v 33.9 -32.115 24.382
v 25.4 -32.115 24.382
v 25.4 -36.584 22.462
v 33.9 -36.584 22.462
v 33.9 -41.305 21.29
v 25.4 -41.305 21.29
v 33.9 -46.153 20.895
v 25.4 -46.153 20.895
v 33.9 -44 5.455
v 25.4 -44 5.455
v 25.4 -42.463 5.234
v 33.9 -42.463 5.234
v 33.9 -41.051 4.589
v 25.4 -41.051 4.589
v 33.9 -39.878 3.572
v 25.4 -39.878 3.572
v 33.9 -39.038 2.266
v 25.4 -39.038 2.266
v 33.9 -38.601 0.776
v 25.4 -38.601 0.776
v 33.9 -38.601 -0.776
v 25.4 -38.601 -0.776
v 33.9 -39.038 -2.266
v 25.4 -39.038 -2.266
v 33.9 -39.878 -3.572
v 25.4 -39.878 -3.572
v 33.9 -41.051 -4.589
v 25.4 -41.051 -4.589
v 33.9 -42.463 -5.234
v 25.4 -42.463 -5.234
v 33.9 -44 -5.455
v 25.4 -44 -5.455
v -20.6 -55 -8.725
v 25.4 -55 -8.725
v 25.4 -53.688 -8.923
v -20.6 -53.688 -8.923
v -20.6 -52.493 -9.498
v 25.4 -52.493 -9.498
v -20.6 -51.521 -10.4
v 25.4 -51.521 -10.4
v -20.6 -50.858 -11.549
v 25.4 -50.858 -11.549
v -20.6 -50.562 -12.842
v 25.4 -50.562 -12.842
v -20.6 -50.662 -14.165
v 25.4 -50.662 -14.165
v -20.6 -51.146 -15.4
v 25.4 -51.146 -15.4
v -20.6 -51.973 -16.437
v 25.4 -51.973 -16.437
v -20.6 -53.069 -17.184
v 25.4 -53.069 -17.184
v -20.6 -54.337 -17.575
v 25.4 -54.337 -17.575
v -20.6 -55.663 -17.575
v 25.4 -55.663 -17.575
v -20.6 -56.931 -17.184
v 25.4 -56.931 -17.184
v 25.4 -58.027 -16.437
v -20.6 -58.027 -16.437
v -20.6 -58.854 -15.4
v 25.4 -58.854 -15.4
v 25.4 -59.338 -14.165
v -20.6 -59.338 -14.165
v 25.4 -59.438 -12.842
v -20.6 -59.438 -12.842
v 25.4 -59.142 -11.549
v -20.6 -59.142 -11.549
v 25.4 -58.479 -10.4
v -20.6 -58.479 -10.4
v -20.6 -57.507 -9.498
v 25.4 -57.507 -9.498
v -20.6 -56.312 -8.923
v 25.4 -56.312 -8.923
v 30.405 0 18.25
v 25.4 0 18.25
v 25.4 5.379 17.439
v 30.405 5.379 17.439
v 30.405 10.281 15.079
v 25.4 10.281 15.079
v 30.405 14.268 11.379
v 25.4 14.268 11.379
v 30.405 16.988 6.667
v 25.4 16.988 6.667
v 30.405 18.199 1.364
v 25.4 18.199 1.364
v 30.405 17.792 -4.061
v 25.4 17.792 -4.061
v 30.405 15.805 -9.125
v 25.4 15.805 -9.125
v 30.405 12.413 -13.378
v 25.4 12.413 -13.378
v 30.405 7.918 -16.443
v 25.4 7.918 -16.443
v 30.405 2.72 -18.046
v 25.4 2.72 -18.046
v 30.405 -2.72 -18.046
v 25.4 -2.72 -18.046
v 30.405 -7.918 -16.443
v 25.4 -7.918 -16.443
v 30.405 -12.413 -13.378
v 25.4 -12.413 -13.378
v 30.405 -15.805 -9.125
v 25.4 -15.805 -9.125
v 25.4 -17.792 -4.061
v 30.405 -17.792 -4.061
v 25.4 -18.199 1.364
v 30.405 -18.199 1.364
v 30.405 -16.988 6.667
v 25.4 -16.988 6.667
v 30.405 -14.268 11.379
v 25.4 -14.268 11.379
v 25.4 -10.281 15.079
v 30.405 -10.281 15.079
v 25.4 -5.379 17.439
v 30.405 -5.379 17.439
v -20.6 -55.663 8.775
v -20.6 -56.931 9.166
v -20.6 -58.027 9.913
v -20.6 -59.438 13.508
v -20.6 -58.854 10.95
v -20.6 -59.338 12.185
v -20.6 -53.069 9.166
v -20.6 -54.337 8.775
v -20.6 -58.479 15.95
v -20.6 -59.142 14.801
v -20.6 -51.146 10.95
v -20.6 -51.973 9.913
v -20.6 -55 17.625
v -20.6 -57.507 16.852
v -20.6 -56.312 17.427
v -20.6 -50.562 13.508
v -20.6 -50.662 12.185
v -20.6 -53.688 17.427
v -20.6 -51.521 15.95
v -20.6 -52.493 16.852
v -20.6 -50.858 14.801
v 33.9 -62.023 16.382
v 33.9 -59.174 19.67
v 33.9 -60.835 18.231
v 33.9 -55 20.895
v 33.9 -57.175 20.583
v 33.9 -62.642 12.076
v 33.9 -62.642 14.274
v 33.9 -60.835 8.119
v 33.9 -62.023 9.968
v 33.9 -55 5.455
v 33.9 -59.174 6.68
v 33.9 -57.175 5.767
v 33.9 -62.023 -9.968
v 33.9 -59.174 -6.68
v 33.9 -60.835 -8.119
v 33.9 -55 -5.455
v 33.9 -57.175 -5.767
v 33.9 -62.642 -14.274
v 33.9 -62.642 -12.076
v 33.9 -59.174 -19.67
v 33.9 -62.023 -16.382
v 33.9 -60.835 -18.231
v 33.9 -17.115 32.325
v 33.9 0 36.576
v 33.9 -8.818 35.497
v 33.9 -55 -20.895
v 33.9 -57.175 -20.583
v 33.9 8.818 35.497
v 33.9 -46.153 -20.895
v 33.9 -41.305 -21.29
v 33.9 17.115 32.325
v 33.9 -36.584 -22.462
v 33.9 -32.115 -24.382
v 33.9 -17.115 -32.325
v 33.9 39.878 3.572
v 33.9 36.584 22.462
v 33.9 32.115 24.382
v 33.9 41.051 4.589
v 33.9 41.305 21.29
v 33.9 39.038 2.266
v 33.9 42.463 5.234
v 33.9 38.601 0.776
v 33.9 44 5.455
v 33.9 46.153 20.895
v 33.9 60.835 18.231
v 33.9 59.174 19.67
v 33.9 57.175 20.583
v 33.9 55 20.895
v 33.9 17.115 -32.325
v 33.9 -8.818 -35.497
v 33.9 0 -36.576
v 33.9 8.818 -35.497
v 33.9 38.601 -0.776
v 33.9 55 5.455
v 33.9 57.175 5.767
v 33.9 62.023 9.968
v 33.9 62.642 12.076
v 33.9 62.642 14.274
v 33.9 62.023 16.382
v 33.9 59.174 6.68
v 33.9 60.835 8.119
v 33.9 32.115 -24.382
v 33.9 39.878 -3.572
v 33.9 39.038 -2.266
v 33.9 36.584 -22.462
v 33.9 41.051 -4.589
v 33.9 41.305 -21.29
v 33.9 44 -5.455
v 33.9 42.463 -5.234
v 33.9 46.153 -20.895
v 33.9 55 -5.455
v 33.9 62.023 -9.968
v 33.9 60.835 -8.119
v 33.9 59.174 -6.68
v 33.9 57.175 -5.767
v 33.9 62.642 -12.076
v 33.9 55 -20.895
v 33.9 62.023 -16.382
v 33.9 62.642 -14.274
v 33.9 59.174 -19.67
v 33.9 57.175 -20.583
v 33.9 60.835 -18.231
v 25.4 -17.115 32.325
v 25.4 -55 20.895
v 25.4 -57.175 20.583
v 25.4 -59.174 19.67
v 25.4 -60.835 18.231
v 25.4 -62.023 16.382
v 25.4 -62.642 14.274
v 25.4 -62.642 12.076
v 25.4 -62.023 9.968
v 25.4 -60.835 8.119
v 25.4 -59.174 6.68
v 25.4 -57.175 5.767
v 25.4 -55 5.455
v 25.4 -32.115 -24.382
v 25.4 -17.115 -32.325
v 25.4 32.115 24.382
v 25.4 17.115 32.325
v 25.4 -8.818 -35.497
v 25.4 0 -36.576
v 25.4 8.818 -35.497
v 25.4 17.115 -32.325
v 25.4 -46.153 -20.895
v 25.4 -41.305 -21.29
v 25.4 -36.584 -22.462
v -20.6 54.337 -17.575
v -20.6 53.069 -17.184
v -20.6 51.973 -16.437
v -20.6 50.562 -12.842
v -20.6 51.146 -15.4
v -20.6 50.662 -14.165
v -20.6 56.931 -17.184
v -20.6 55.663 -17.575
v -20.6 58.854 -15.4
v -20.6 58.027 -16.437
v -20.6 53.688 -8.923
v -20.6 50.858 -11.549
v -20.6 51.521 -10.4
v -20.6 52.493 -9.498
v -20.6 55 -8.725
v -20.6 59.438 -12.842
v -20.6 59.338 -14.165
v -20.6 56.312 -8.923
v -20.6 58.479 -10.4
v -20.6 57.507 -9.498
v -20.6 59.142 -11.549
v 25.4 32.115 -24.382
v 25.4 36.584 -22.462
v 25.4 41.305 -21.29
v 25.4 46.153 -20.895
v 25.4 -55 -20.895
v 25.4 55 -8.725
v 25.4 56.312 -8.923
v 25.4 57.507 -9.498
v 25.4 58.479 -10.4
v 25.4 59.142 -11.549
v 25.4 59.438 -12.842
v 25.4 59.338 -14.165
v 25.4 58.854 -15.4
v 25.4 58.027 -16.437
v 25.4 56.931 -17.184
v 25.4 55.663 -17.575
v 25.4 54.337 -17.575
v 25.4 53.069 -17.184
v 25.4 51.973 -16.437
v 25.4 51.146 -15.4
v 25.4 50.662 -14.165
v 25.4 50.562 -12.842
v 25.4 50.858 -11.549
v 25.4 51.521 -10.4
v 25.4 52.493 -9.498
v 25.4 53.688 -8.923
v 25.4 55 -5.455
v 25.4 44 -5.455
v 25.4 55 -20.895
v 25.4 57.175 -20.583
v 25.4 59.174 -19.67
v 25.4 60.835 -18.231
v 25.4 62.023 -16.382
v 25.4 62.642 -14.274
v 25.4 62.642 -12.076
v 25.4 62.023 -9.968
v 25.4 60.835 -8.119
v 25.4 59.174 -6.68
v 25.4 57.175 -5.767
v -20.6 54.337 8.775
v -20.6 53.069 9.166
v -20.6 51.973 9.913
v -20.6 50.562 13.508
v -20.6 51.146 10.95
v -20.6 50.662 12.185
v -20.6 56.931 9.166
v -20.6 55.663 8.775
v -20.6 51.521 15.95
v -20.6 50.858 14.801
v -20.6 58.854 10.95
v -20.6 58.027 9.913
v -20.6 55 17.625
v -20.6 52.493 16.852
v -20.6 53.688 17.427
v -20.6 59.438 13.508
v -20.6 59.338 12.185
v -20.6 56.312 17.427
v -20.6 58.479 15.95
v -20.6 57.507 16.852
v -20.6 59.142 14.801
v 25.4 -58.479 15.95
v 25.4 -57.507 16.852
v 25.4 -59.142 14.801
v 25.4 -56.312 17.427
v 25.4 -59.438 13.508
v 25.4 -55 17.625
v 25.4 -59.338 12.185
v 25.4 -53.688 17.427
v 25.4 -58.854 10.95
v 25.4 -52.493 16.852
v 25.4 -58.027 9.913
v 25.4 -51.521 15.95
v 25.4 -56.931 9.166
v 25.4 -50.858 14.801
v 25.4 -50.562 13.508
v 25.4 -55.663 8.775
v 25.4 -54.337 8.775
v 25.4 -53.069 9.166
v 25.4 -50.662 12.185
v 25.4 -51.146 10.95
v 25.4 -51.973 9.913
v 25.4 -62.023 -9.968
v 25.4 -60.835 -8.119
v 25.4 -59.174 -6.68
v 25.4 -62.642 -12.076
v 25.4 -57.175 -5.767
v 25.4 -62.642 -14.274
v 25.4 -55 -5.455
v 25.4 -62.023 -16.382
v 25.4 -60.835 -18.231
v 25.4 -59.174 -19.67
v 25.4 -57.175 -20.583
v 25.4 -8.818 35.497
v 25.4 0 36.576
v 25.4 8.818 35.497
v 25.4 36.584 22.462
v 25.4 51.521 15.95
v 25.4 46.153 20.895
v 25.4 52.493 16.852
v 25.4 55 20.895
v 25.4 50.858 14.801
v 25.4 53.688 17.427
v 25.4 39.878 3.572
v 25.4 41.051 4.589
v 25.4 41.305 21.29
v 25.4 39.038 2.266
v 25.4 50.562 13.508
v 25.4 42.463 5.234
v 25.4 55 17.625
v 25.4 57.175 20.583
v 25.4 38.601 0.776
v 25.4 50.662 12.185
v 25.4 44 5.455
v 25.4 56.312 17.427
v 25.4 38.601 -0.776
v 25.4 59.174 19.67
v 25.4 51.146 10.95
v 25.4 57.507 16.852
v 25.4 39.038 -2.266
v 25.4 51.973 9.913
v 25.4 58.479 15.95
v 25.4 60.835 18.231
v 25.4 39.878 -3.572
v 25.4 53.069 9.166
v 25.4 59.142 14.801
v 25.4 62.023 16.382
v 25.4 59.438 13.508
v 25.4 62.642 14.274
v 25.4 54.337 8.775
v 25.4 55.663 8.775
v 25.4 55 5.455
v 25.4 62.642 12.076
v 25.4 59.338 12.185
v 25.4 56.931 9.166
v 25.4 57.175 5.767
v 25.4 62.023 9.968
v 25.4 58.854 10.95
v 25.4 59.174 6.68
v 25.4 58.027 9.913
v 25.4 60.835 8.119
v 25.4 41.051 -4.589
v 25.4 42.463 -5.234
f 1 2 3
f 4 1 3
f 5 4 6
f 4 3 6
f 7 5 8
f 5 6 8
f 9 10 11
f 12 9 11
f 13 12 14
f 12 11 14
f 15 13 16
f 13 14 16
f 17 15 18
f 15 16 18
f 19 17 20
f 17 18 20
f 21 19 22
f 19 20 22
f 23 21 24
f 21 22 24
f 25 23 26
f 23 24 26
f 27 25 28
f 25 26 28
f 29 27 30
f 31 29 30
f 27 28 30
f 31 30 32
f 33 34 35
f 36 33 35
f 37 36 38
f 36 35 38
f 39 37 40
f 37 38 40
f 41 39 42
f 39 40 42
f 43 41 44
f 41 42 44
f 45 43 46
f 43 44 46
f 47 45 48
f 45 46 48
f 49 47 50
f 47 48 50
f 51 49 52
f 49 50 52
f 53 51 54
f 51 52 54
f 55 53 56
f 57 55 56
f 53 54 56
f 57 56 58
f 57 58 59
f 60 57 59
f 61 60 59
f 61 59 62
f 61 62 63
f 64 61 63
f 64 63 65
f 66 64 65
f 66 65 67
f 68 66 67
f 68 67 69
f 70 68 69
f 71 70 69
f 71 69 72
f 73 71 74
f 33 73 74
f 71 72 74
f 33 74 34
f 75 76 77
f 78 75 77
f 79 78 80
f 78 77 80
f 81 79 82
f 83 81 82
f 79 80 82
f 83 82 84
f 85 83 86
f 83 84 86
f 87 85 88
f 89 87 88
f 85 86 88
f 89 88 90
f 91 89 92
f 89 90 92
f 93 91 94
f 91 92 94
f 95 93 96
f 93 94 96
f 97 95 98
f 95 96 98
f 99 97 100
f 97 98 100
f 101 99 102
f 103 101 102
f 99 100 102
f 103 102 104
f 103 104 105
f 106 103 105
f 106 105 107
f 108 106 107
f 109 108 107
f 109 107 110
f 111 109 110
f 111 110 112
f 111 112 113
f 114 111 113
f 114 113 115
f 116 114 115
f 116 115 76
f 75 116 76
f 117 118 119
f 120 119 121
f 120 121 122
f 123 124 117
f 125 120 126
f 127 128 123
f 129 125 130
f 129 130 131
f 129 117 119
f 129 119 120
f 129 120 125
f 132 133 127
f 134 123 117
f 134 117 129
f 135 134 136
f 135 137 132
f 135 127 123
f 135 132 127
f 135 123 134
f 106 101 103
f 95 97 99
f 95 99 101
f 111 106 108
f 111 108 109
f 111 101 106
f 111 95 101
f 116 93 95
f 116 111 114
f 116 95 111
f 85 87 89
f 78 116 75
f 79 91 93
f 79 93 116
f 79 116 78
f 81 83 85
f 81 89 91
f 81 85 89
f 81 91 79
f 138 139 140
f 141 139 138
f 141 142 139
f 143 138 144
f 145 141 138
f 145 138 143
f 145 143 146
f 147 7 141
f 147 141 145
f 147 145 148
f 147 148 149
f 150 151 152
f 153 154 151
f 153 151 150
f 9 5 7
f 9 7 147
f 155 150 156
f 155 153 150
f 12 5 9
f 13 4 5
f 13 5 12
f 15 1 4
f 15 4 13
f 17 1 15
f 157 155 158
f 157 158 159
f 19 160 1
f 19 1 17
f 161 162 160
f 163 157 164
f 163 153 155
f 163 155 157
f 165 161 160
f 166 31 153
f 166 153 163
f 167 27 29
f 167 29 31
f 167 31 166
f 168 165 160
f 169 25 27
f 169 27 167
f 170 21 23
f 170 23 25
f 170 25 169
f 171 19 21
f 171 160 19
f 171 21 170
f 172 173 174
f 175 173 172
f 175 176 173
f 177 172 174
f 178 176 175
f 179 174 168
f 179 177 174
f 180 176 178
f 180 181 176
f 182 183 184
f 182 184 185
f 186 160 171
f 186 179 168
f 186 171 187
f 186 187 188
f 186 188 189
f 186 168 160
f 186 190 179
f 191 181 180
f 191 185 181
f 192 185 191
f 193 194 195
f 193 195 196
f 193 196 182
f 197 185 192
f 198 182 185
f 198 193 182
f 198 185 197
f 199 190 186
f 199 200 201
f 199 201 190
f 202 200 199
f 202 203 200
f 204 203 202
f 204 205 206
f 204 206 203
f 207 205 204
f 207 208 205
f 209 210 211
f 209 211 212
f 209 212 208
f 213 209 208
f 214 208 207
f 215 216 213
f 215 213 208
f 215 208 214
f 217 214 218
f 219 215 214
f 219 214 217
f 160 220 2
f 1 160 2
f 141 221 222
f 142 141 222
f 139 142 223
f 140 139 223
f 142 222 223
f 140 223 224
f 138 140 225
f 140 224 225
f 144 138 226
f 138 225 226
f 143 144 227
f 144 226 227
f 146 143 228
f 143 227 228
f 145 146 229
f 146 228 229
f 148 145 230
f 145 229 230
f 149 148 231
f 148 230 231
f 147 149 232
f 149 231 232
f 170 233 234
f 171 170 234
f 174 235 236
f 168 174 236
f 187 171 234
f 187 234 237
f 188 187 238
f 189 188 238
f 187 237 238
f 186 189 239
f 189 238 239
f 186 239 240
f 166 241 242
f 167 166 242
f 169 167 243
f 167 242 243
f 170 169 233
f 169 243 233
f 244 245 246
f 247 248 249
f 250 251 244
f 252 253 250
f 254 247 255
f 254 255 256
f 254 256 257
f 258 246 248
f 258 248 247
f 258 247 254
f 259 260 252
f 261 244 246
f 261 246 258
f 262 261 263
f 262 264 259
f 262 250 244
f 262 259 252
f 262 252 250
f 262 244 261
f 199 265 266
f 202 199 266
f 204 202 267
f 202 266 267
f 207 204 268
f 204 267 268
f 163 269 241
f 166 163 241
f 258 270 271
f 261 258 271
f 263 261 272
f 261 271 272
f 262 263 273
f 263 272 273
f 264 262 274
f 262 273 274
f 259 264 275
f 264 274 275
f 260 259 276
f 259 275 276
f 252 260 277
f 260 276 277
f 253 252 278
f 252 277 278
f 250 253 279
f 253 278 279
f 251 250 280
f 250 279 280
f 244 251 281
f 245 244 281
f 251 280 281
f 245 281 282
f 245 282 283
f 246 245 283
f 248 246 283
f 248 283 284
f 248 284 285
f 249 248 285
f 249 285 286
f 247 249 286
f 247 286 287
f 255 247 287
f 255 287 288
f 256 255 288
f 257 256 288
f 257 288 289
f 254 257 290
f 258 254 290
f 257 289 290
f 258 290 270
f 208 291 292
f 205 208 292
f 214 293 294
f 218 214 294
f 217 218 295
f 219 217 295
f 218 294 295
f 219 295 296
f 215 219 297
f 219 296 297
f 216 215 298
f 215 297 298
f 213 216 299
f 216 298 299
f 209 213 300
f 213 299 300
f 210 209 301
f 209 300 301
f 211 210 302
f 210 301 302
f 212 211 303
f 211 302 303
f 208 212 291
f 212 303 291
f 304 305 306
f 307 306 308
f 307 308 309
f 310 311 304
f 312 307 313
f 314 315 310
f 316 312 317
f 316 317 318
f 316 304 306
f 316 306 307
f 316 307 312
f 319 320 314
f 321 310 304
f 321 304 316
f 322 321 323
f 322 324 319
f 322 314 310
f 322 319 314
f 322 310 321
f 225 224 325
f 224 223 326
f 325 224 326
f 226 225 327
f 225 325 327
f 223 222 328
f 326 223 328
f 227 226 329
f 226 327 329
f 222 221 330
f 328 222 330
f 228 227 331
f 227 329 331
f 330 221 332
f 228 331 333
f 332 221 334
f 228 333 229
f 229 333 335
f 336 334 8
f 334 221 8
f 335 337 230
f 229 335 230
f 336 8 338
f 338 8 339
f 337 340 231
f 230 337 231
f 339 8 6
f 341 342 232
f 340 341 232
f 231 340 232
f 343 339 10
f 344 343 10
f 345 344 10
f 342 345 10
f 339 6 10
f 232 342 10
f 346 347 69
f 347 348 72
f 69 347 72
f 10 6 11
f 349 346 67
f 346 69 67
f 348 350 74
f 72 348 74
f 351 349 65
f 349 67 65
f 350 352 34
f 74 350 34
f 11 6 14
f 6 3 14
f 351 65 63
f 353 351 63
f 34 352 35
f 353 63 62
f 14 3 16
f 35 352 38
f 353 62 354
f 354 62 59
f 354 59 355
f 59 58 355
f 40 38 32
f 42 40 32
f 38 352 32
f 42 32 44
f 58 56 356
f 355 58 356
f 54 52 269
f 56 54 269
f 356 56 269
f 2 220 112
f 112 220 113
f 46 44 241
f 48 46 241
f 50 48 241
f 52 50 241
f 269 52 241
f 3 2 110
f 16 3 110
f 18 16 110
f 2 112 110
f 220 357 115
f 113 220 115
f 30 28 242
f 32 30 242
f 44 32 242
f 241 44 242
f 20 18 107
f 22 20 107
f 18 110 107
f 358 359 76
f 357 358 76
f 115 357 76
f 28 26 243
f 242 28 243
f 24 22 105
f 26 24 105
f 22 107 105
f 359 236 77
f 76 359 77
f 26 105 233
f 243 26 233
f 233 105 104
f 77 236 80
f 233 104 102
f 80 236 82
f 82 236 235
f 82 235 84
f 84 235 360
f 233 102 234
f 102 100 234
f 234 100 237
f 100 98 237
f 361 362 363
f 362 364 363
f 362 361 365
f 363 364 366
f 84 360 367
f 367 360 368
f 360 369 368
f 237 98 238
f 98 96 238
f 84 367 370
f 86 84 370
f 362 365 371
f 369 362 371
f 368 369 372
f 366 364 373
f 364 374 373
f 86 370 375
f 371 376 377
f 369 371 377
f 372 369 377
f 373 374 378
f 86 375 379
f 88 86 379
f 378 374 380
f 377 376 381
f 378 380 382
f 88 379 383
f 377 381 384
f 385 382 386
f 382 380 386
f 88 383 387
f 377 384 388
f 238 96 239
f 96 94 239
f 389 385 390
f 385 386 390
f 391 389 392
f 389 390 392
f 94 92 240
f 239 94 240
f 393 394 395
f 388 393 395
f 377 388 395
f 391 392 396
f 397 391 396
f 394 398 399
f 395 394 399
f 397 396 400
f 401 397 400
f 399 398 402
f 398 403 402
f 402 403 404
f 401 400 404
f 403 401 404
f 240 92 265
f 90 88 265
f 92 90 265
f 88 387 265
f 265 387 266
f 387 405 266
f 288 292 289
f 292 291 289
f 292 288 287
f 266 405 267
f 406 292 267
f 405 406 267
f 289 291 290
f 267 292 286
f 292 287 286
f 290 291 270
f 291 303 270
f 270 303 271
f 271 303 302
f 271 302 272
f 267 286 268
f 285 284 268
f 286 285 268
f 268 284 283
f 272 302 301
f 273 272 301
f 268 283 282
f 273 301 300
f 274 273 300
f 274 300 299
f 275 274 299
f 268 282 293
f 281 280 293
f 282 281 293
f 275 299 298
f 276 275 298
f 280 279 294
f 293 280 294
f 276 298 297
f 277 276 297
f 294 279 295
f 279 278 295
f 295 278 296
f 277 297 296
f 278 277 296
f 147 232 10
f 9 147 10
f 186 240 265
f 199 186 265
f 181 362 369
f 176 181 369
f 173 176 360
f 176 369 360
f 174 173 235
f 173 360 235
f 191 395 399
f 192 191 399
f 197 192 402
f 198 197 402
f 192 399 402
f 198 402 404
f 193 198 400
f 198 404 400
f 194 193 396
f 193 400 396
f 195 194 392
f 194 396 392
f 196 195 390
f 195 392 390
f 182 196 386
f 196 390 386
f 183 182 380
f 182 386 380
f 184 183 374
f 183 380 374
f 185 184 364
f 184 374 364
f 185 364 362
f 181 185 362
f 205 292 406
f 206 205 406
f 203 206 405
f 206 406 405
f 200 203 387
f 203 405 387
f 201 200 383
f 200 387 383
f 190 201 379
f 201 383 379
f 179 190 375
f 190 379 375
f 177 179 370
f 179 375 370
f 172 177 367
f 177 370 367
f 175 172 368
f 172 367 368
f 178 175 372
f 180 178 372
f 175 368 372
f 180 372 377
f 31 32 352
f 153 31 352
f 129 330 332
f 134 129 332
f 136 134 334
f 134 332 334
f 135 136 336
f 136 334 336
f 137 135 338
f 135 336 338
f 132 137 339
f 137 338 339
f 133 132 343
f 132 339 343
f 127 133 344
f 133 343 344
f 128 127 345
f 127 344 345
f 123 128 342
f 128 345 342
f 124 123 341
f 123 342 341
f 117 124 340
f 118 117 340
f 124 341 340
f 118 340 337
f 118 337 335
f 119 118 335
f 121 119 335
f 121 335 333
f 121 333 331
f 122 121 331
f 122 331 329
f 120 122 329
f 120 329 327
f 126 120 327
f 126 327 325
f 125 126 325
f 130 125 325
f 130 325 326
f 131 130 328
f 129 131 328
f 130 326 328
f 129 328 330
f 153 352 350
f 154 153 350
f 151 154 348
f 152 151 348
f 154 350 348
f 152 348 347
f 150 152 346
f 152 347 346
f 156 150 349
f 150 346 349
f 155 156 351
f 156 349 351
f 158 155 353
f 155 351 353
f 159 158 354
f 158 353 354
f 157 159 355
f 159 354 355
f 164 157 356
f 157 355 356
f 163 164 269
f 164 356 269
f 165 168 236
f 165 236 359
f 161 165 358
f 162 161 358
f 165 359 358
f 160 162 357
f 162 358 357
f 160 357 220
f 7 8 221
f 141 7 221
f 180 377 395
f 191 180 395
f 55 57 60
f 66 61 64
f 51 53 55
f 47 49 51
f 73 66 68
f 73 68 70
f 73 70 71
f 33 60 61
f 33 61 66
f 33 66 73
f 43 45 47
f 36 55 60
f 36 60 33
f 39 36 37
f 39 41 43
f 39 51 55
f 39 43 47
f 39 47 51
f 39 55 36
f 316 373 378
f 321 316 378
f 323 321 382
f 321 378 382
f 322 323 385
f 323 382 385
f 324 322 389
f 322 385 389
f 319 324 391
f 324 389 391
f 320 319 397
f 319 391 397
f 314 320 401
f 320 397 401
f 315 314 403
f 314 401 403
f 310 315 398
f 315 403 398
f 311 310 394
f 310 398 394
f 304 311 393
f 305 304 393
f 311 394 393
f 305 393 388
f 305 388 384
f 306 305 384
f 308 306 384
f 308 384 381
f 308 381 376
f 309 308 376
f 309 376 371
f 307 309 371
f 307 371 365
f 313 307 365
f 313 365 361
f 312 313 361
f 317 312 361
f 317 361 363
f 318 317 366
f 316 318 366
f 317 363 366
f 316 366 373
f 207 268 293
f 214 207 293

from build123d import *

# Parameters (mm, degrees)
SKETCH1_W           = 17.145
SKETCH1_H           = 18.25
SKETCH2_R           = 3.71475
CUT_EXTRUDE1_DEPTH  = 8.5725
SKETCH3_R           = 18.25
BOSS_EXTRUDE1_DEPTH = 8.5
SKETCH4_R           = 4.45
BOSS_EXTRUDE2_DEPTH = 46
SKETCH5_R           = 18.25
CUT_EXTRUDE2_DEPTH  = 22.15


with BuildPart() as part:
    # Sketch1 → Revolve1 (revolve)
    with BuildSketch(Plane.XY):
        with Locations((16.8275, 9.125)):
            Rectangle(SKETCH1_W, SKETCH1_H)
    revolve(axis=Axis((8.255, 0, 0), (1, 0, 0)))

    # Sketch2 → Cut-Extrude1 (cut)
    with BuildSketch(Plane.ZY.offset(-8.255)):
        Circle(SKETCH2_R)
    extrude(amount=-CUT_EXTRUDE1_DEPTH, mode=Mode.SUBTRACT)


with BuildPart() as body_2:
    # Sketch3 → Boss-Extrude1 (new body)
    with BuildSketch(Plane(origin=(25.4, 0, 0), x_dir=(0, 0, -1), z_dir=(1, 0, 0))):
        with BuildLine():
            Line((-24.382347836, 32.115154563), (-32.324530318, 17.115154563))
            ThreePointArc((-32.324530318, 17.115154563), (-36.576, 0), (-32.324530318, -17.115154563))
            Line((-32.324530318, -17.115154563), (-24.382347836, -32.115154563))
            ThreePointArc((-24.382347836, -32.115154563), (-21.780072988, -38.920854003), (-20.89525, -46.153175037))
            Line((-20.89525, -46.153175037), (-20.89525, -55))
            ThreePointArc((-20.89525, -55), (-13.175, -62.72025), (-5.45475, -55))
            Line((-5.45475, -55), (-5.45475, -44))
            ThreePointArc((-5.45475, -44), (0, -38.54525), (5.45475, -44))
            Line((5.45475, -44), (5.45475, -55))
            ThreePointArc((5.45475, -55), (13.175, -62.72025), (20.89525, -55))
            Line((20.89525, -55), (20.89525, -46.153175037))
            ThreePointArc((20.89525, -46.153175037), (21.780072988, -38.920854003), (24.382347836, -32.115154563))
            Line((24.382347836, -32.115154563), (32.324530318, -17.115154563))
            ThreePointArc((32.324530318, -17.115154563), (36.576, 0), (32.324530318, 17.115154563))
            Line((32.324530318, 17.115154563), (24.382347836, 32.115154563))
            ThreePointArc((24.382347836, 32.115154563), (21.780072988, 38.920854003), (20.89525, 46.153175037))
            Line((20.89525, 46.153175037), (20.89525, 55))
            ThreePointArc((20.89525, 55), (13.175, 62.72025), (5.45475, 55))
            Line((5.45475, 55), (5.45475, 44))
            ThreePointArc((5.45475, 44), (0, 38.54525), (-5.45475, 44))
            Line((-5.45475, 44), (-5.45475, 55))
            ThreePointArc((-5.45475, 55), (-13.175, 62.72025), (-20.89525, 55))
            Line((-20.89525, 55), (-20.89525, 46.153175037))
            ThreePointArc((-20.89525, 46.153175037), (-21.780072988, 38.920854003), (-24.382347836, 32.115154563))
        make_face()
        Circle(SKETCH3_R, mode=Mode.SUBTRACT)
        Circle(SKETCH3_R)
    extrude(amount=BOSS_EXTRUDE1_DEPTH)

    # Sketch4 → Boss-Extrude2 (add)
    with BuildSketch(Plane.ZY.offset(-25.4)):
        with Locations((-13.175, 55)):
            Circle(SKETCH4_R)
        with Locations((13.175, -55)):
            Circle(SKETCH4_R)
        with Locations((13.175, 55)):
            Circle(SKETCH4_R)
        with Locations((-13.175, -55)):
            Circle(SKETCH4_R)
    extrude(amount=BOSS_EXTRUDE2_DEPTH)


with BuildPart() as cut_extrude2_tool:
    # Sketch5 → Cut-Extrude2 (new body)
    with BuildSketch(Plane.ZY.offset(-8.255)):
        Circle(SKETCH5_R)
    extrude(amount=-CUT_EXTRUDE2_DEPTH)


with BuildPart() as part_1:
    add(part.part)

    # Cut-Extrude2: cut by cut_extrude2_tool
    add(cut_extrude2_tool.part, mode=Mode.SUBTRACT)


with BuildPart() as body_2_1:
    add(body_2.part)

    # Cut-Extrude2: cut by cut_extrude2_tool
    add(cut_extrude2_tool.part, mode=Mode.SUBTRACT)


solid = body_2_1.part
